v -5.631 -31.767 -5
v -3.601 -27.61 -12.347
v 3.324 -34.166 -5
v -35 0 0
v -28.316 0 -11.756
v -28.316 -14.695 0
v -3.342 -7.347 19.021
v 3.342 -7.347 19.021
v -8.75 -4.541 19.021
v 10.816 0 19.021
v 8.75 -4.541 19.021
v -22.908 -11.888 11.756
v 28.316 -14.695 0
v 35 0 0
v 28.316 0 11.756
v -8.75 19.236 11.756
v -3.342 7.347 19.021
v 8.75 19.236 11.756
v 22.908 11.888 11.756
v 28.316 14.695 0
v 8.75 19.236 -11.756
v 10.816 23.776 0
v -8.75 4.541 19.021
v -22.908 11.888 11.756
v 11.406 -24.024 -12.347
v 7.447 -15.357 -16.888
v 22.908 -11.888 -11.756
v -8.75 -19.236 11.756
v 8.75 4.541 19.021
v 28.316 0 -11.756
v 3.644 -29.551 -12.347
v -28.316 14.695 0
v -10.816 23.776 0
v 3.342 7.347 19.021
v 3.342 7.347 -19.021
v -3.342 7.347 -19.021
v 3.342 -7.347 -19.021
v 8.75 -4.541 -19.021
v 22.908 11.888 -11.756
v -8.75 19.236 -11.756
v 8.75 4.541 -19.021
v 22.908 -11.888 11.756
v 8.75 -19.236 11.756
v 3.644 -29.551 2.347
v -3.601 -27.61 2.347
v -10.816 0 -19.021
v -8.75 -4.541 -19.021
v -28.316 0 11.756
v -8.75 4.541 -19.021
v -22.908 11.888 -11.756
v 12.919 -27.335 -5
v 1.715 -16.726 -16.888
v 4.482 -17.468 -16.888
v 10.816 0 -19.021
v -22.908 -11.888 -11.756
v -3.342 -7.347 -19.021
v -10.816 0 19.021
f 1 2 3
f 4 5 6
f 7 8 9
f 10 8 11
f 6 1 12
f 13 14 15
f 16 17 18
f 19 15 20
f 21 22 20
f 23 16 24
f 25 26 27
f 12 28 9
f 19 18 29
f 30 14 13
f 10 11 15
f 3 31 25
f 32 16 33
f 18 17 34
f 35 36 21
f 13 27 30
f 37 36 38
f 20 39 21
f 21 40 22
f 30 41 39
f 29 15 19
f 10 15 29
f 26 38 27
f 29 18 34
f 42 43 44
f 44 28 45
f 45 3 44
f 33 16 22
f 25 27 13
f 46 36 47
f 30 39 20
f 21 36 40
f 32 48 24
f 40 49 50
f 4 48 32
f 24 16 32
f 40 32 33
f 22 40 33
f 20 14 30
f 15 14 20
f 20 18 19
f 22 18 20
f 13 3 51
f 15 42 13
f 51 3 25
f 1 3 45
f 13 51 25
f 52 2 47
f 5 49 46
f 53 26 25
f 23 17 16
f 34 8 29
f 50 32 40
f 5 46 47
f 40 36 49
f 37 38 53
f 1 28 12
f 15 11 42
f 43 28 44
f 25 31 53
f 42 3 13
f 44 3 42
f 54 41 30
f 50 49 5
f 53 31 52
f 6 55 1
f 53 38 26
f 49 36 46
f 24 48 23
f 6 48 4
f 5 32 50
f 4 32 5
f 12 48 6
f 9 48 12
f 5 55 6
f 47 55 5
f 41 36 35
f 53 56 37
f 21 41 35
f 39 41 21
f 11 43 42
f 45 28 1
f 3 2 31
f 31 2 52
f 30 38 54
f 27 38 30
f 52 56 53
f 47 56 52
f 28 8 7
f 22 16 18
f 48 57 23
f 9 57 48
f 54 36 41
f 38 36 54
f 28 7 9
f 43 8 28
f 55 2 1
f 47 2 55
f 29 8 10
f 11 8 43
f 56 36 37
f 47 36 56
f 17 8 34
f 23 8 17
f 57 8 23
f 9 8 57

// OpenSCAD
//dummy of a stone
color("Grey")  stone();
module stone(){
  hull(){
    scale([1,50/70,40/70]) sphere(d=70,$fn=10);
    translate([5,-10,-5]) rotate(-15) scale([30/50,1,25/50]) sphere(d=50,$fn=10);
  }
}
